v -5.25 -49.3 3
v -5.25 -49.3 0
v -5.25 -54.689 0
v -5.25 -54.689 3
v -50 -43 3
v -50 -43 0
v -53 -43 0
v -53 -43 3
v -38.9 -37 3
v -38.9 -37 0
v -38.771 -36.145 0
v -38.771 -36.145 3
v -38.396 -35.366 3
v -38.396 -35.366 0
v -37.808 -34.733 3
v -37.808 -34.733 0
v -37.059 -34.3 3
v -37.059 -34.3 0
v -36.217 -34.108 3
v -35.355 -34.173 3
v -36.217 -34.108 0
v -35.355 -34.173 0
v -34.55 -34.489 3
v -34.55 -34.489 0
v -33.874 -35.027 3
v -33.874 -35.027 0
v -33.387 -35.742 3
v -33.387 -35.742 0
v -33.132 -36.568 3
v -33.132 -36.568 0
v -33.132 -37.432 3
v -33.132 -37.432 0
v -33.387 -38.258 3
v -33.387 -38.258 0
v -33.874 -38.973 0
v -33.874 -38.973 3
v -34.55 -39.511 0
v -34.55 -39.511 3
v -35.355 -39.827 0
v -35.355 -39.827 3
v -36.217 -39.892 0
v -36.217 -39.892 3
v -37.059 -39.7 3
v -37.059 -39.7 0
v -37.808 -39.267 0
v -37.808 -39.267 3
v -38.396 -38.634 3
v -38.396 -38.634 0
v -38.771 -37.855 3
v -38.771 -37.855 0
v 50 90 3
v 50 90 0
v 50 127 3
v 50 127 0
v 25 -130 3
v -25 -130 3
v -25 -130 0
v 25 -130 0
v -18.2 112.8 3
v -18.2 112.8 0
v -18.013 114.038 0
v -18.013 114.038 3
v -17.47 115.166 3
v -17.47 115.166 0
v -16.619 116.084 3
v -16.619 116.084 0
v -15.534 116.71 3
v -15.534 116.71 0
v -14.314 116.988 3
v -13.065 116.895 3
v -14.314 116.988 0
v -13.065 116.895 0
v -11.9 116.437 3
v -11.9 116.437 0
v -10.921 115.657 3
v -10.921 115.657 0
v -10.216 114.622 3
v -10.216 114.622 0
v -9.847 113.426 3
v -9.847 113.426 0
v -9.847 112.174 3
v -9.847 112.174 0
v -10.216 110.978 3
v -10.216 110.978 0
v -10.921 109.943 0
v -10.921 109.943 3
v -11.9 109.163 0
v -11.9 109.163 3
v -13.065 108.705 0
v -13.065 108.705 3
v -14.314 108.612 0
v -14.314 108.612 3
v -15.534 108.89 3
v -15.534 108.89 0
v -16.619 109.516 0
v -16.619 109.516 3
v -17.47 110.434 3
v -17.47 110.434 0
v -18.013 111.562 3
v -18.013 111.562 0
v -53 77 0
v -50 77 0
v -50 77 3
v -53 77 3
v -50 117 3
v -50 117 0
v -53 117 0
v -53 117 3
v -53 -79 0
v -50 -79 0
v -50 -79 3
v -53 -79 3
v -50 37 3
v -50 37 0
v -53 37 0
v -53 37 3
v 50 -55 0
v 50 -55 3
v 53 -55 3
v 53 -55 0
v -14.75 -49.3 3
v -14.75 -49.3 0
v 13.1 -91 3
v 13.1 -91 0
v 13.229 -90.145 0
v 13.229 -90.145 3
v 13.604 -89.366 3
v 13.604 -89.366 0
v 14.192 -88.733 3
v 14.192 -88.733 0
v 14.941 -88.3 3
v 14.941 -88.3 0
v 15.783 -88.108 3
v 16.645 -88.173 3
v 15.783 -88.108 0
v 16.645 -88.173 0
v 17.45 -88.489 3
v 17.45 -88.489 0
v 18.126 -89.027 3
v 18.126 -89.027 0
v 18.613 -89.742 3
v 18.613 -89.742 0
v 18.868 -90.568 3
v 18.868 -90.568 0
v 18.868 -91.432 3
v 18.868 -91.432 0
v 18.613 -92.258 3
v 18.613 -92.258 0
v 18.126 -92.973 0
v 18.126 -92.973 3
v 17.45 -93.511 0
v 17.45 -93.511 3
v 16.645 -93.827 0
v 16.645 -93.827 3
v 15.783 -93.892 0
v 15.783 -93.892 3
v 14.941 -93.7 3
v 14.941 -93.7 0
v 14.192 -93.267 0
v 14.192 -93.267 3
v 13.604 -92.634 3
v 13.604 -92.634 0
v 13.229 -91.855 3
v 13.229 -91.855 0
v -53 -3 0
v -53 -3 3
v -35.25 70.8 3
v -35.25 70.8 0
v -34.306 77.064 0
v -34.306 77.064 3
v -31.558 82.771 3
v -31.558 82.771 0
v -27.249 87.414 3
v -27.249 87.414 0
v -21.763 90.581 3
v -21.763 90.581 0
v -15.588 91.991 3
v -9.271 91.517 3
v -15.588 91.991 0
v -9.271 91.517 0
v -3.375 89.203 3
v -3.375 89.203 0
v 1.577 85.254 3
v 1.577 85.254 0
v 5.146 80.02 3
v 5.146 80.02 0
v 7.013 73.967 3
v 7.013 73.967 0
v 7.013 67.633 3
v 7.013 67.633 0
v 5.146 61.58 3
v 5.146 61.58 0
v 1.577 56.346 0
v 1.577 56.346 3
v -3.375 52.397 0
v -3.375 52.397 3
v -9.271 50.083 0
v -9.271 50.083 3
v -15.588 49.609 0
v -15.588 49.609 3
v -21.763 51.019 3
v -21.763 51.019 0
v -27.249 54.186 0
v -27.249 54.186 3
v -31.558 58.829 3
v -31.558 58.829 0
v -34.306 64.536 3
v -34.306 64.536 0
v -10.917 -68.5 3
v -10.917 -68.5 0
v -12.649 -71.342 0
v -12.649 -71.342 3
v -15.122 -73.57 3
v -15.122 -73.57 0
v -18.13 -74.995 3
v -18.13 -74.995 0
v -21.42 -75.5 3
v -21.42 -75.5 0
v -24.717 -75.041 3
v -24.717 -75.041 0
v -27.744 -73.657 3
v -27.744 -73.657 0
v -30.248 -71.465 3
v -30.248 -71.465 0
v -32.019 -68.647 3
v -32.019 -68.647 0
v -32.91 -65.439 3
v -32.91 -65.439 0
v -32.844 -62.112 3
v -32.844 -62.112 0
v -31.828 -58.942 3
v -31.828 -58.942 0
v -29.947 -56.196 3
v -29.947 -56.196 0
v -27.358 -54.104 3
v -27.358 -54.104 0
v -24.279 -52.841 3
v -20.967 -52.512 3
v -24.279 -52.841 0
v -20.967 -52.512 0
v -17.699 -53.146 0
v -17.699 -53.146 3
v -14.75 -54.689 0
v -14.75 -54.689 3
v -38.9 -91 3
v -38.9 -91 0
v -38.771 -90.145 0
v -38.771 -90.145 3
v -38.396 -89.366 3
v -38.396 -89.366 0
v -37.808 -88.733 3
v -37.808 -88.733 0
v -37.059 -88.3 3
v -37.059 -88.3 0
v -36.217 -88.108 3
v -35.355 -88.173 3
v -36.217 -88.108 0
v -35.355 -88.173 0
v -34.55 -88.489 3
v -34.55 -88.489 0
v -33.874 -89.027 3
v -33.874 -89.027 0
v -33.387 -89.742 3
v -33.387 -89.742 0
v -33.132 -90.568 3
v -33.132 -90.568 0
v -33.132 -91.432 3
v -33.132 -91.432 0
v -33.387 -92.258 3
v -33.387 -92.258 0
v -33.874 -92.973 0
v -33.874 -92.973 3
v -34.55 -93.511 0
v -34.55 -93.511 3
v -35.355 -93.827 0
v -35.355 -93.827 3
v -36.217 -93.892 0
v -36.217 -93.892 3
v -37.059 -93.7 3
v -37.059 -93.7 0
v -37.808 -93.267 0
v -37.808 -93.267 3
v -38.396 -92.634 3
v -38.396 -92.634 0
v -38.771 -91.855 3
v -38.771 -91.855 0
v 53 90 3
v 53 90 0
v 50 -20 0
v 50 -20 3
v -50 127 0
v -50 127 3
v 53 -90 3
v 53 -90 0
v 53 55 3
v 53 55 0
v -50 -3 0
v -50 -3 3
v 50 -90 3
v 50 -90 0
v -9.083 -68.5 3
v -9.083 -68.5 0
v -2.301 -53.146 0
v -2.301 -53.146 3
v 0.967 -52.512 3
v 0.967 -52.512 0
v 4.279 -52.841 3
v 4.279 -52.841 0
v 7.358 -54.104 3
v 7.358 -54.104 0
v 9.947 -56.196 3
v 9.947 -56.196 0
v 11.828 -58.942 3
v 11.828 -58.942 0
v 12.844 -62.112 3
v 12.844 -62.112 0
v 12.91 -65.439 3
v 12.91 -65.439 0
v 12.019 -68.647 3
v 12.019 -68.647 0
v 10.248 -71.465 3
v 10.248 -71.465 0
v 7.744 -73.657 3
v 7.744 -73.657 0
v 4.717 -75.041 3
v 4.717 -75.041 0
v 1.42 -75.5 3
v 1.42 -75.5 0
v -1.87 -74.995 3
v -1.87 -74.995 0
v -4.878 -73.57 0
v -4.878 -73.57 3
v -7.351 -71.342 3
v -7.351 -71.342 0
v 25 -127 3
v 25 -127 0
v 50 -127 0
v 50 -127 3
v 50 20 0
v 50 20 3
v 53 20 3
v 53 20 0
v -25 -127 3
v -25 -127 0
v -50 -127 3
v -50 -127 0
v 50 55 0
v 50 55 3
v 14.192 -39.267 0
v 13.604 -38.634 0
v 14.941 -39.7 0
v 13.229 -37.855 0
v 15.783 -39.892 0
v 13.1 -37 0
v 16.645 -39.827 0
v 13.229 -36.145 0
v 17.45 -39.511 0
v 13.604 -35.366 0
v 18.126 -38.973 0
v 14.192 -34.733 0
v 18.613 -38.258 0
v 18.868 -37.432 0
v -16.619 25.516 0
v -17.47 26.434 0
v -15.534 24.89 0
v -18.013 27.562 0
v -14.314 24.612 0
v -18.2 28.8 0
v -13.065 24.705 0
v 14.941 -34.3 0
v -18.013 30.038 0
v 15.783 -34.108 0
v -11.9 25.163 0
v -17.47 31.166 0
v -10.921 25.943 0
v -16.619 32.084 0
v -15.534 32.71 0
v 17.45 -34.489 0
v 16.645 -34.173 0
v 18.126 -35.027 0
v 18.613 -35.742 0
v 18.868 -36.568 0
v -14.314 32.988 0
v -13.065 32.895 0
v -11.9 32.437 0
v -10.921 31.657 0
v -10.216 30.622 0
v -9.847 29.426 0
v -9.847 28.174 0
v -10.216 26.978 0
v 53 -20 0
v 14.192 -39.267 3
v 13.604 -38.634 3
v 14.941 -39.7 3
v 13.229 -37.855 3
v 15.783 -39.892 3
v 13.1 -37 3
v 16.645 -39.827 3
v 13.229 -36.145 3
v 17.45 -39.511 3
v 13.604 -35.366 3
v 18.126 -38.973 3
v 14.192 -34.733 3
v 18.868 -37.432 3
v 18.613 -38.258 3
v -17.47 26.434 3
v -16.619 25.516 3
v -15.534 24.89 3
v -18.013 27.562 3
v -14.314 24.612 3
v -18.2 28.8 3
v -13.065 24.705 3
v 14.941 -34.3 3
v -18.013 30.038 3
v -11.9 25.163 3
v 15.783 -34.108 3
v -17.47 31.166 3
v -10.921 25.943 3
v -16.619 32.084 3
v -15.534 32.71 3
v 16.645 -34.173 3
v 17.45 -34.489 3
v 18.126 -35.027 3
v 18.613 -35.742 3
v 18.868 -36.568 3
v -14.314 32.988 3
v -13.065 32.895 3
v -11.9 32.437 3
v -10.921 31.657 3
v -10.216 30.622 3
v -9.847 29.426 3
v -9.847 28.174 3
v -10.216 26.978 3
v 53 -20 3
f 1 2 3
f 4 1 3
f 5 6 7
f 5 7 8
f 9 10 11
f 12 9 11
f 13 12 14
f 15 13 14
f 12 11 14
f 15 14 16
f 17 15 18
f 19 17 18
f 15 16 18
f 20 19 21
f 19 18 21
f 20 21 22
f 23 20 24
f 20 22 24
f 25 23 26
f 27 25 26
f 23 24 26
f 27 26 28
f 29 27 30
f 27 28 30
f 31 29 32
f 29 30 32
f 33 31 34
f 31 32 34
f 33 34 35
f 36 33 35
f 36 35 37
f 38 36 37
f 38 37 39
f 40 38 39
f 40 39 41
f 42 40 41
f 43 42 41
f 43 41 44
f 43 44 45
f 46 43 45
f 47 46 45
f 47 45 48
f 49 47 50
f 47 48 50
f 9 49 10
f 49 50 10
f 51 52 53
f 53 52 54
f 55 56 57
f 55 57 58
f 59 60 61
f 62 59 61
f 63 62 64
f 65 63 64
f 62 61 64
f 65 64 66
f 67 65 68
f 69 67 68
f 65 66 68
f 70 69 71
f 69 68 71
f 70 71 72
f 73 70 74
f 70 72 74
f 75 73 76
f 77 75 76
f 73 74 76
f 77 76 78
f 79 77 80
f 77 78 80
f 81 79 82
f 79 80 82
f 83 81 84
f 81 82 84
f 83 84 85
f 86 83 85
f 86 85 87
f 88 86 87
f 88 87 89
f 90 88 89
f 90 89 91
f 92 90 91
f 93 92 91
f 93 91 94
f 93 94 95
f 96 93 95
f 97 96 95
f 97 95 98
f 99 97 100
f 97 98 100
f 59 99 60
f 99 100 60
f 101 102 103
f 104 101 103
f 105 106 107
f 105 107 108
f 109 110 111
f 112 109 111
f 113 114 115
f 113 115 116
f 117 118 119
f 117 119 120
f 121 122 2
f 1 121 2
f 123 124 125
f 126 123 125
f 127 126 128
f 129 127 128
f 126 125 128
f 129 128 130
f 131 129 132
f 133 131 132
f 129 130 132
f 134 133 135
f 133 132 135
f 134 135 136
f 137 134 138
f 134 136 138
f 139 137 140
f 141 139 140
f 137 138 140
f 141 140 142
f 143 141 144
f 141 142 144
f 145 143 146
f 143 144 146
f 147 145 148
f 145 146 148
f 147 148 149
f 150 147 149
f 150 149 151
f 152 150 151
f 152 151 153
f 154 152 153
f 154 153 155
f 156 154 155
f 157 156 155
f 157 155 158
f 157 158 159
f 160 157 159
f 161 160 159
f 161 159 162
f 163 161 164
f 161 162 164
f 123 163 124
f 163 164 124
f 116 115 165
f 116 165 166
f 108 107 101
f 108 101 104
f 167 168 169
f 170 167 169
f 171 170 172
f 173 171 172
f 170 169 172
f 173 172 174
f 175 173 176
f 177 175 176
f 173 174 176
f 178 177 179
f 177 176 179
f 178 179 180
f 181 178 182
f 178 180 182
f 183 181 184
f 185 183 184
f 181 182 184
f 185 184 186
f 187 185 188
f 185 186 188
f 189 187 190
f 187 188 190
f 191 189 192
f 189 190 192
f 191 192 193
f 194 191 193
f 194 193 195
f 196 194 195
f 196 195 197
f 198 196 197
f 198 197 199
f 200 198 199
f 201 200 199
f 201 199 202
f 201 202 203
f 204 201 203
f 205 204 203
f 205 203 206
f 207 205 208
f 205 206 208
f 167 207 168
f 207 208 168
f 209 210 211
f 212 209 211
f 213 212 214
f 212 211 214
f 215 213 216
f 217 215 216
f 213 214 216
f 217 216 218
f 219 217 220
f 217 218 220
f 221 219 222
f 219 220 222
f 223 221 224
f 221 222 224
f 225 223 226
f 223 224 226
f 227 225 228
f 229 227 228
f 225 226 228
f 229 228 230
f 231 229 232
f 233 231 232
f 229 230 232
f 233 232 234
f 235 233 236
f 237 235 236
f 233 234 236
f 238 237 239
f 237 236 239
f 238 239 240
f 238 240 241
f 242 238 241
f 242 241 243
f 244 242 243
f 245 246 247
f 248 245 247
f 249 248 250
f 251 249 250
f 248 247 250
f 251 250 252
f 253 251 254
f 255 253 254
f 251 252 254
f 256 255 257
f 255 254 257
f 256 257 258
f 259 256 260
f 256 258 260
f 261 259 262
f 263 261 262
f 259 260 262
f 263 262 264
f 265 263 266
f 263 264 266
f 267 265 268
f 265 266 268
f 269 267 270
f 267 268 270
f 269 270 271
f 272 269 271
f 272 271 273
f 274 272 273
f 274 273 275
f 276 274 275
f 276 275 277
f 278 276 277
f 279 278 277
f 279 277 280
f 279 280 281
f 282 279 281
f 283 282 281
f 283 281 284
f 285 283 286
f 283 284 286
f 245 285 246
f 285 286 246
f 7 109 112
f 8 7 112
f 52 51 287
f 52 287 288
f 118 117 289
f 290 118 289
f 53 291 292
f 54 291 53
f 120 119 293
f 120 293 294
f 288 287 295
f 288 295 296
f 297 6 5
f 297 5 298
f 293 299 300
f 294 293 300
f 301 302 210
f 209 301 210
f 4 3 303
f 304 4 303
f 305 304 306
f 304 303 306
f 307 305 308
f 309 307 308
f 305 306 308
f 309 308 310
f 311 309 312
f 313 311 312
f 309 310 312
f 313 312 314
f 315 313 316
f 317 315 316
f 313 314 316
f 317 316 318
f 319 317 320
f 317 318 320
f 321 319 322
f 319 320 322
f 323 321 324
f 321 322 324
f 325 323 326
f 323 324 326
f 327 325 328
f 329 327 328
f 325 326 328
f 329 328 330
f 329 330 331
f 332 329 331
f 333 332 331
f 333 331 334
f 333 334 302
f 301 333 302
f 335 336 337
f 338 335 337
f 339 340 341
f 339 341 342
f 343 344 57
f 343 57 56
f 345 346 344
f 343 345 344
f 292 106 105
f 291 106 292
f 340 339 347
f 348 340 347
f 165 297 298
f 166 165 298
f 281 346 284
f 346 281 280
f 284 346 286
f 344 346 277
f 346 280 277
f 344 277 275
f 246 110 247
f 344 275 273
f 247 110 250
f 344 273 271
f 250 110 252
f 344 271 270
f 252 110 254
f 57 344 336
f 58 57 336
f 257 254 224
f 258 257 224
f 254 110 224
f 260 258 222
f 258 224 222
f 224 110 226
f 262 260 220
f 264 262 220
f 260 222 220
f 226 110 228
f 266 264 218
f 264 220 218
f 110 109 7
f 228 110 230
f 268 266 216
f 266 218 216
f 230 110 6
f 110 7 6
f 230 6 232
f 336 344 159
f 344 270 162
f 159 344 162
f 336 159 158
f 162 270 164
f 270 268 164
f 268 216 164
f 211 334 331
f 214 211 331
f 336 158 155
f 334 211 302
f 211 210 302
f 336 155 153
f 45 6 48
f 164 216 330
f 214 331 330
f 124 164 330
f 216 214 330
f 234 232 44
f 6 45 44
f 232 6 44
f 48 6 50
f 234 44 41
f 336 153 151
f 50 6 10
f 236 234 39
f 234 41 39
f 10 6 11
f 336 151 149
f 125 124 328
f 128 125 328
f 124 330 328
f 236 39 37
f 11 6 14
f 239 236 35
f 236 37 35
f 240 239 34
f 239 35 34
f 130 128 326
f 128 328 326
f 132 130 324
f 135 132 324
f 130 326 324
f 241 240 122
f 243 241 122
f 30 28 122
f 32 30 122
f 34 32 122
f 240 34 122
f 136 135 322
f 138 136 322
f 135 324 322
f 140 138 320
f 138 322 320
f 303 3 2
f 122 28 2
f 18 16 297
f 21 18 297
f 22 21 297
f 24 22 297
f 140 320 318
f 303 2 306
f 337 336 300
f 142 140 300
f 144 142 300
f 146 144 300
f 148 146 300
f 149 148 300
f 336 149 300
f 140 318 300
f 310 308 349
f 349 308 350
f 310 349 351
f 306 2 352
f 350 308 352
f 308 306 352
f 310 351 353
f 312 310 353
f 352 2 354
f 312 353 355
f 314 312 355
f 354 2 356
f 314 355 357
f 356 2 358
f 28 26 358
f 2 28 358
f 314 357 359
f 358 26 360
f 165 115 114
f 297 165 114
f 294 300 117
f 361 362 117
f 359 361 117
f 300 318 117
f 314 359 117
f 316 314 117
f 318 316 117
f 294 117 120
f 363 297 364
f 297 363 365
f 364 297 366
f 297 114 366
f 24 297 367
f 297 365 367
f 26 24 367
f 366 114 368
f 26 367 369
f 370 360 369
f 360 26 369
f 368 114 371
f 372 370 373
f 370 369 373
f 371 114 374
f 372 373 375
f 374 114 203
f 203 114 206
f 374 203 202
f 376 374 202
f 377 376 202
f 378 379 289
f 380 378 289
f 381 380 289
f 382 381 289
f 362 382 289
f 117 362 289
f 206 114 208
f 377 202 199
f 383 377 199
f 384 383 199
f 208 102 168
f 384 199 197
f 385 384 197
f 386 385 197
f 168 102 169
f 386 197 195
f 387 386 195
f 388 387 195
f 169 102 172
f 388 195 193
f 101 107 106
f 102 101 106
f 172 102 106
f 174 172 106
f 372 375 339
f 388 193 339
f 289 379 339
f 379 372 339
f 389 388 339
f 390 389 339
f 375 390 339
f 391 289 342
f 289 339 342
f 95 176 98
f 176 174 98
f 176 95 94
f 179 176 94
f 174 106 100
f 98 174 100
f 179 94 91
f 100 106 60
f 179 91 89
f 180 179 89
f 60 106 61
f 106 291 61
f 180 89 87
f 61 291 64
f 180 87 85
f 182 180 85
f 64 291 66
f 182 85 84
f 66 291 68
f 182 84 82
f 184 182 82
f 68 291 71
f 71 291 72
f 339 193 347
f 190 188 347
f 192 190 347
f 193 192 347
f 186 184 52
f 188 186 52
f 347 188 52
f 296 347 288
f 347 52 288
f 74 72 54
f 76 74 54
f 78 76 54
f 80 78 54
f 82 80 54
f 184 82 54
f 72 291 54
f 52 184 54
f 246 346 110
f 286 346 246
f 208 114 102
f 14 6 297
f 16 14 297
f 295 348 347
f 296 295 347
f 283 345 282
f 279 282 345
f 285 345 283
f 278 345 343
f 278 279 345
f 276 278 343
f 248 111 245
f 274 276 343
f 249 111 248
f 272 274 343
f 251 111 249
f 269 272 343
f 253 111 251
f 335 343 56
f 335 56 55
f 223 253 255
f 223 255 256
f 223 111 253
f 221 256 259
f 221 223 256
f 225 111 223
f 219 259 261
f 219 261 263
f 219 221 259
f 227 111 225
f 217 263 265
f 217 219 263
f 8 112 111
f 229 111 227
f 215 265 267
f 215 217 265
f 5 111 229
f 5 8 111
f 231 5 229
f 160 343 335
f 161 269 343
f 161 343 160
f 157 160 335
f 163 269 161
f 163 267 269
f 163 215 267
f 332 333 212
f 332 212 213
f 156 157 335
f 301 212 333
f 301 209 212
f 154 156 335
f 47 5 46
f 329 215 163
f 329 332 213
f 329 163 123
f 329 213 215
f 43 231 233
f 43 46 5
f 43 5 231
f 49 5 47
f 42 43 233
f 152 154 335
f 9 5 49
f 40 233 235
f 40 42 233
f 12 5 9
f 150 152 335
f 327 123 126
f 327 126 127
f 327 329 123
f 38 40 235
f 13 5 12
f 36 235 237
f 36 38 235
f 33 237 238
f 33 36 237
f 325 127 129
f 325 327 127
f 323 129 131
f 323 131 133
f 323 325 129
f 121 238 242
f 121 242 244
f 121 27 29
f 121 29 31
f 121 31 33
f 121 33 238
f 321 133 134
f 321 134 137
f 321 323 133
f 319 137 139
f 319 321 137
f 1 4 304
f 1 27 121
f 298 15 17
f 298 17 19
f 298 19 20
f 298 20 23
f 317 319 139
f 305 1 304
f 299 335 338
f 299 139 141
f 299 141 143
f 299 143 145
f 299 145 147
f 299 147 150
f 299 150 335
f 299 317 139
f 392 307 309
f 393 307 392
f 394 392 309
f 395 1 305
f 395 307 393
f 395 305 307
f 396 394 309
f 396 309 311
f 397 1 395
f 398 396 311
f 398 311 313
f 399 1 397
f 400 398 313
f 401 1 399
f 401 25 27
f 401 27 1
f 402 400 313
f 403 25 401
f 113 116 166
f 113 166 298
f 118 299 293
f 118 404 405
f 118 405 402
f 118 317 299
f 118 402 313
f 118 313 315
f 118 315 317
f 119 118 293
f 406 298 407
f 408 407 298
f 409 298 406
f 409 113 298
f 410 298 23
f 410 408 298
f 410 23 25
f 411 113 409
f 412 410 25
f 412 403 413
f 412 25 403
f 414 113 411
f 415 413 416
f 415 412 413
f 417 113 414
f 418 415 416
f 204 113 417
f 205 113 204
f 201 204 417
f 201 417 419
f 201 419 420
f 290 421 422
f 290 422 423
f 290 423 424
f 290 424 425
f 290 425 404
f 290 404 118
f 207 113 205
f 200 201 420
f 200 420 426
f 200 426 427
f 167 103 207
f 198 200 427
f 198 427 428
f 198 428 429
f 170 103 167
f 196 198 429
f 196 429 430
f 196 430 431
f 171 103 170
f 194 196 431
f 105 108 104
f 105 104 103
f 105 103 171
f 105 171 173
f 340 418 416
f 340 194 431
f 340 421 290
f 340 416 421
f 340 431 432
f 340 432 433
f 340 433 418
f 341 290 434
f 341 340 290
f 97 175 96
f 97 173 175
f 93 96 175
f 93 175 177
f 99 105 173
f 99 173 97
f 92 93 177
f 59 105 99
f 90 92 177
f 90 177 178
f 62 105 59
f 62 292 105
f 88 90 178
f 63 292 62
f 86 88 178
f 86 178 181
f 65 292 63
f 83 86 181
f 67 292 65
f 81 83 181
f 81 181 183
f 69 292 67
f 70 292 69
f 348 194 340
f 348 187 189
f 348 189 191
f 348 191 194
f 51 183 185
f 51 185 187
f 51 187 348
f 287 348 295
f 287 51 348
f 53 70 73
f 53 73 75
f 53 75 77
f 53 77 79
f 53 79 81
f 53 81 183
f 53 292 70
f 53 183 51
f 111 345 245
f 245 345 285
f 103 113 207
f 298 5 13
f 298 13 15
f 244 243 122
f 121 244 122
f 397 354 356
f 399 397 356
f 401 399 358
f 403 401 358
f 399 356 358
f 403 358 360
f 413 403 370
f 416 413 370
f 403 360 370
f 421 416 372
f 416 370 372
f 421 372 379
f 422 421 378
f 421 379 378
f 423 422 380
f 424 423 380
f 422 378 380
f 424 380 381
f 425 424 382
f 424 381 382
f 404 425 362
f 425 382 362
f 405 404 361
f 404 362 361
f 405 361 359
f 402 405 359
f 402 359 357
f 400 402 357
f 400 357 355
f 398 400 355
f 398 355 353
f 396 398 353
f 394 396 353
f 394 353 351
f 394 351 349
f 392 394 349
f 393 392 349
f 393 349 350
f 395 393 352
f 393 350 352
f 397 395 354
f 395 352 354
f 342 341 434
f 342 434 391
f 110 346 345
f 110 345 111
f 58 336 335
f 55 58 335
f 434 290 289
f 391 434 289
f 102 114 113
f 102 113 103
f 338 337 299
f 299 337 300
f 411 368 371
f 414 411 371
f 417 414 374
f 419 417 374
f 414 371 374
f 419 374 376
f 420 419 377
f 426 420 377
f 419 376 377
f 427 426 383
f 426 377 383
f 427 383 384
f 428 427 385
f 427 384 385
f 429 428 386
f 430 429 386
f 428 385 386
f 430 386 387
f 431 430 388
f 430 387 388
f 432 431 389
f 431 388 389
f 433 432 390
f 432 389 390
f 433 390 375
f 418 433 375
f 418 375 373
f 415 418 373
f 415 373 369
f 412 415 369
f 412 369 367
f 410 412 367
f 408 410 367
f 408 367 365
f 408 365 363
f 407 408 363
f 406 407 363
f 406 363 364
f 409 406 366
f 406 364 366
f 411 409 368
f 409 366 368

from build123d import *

# Parameters (mm, degrees)
SKETCH1_W           = 100
SKETCH1_H           = 254
BOSS_EXTRUDE1_DEPTH = 3
SKETCH2_W           = 50
SKETCH2_H           = 3
BOSS_EXTRUDE2_DEPTH = 3
SKETCH3_W           = 3
SKETCH3_H           = 35
SKETCH3_H_2         = 40
BOSS_EXTRUDE3_DEPTH = 3
SKETCH4_R           = 4.2
SKETCH4_R_2         = 21.25
SKETCH4_R_3         = 2.9
CUT_EXTRUDE1_DEPTH  = 3
SKETCH5_W           = 3
SKETCH5_H           = 36
SKETCH5_H_2         = 40
BOSS_EXTRUDE4_DEPTH = 3


with BuildPart() as part:
    # Sketch1 → Boss-Extrude1 (new body)
    with BuildSketch(Plane.XY):
        Rectangle(SKETCH1_W, SKETCH1_H)
    extrude(amount=BOSS_EXTRUDE1_DEPTH)

    # Sketch2 → Boss-Extrude2 (add)
    with BuildSketch(Plane.XZ.offset(127)):
        with Locations((0, 1.5)):
            Rectangle(SKETCH2_W, SKETCH2_H)
    extrude(amount=BOSS_EXTRUDE2_DEPTH)

    # Sketch3 → Boss-Extrude3 (add)
    with BuildSketch(Plane(origin=(50, 0, 0), x_dir=(0, 0, -1), z_dir=(1, 0, 0))):
        with Locations((-1.5, 72.5)):
            Rectangle(SKETCH3_W, SKETCH3_H)
        with Locations((-1.5, 0)):
            Rectangle(SKETCH3_W, SKETCH3_H_2)
        with Locations((-1.5, -72.5)):
            Rectangle(SKETCH3_W, SKETCH3_H)
    extrude(amount=BOSS_EXTRUDE3_DEPTH)

    # Sketch4 → Cut-Extrude1 (cut)
    with BuildSketch(Plane(origin=(0, 0, 0), x_dir=(-1, 0, 0), z_dir=(0, 0, -1))):
        with Locations((14, 112.8)):
            Circle(SKETCH4_R)
        with Locations((14, 70.8)):
            Circle(SKETCH4_R_2)
        with Locations((14, 28.8)):
            Circle(SKETCH4_R)
        with Locations((-16, -37)):
            Circle(SKETCH4_R_3)
        with Locations((36, -37)):
            Circle(SKETCH4_R_3)
        with Locations((36, -91)):
            Circle(SKETCH4_R_3)
        with Locations((-16, -91)):
            Circle(SKETCH4_R_3)
        with BuildLine():
            Line((9.083005244, -68.5), (10.916994756, -68.5))
            ThreePointArc((10.916994756, -68.5), (32.581133525, -67.075464159), (14.75, -54.689387775))
            Line((14.75, -54.689387775), (14.75, -49.3))
            Line((14.75, -49.3), (10, -49.3))
            Line((10, -49.3), (5.25, -49.3))
            Line((5.25, -49.3), (5.25, -54.689387775))
            ThreePointArc((5.25, -54.689387775), (-12.581133525, -67.075464159), (9.083005244, -68.5))
        make_face()
    extrude(amount=-CUT_EXTRUDE1_DEPTH, mode=Mode.SUBTRACT)

    # Sketch5 → Boss-Extrude4 (add)
    with BuildSketch(Plane.ZY.offset(50)):
        with Locations((1.5, -61)):
            Rectangle(SKETCH5_W, SKETCH5_H)
        with Locations((1.5, 17)):
            Rectangle(SKETCH5_W, SKETCH5_H_2)
        with Locations((1.5, 97)):
            Rectangle(SKETCH5_W, SKETCH5_H_2)
    extrude(amount=BOSS_EXTRUDE4_DEPTH)


solid = part.part
